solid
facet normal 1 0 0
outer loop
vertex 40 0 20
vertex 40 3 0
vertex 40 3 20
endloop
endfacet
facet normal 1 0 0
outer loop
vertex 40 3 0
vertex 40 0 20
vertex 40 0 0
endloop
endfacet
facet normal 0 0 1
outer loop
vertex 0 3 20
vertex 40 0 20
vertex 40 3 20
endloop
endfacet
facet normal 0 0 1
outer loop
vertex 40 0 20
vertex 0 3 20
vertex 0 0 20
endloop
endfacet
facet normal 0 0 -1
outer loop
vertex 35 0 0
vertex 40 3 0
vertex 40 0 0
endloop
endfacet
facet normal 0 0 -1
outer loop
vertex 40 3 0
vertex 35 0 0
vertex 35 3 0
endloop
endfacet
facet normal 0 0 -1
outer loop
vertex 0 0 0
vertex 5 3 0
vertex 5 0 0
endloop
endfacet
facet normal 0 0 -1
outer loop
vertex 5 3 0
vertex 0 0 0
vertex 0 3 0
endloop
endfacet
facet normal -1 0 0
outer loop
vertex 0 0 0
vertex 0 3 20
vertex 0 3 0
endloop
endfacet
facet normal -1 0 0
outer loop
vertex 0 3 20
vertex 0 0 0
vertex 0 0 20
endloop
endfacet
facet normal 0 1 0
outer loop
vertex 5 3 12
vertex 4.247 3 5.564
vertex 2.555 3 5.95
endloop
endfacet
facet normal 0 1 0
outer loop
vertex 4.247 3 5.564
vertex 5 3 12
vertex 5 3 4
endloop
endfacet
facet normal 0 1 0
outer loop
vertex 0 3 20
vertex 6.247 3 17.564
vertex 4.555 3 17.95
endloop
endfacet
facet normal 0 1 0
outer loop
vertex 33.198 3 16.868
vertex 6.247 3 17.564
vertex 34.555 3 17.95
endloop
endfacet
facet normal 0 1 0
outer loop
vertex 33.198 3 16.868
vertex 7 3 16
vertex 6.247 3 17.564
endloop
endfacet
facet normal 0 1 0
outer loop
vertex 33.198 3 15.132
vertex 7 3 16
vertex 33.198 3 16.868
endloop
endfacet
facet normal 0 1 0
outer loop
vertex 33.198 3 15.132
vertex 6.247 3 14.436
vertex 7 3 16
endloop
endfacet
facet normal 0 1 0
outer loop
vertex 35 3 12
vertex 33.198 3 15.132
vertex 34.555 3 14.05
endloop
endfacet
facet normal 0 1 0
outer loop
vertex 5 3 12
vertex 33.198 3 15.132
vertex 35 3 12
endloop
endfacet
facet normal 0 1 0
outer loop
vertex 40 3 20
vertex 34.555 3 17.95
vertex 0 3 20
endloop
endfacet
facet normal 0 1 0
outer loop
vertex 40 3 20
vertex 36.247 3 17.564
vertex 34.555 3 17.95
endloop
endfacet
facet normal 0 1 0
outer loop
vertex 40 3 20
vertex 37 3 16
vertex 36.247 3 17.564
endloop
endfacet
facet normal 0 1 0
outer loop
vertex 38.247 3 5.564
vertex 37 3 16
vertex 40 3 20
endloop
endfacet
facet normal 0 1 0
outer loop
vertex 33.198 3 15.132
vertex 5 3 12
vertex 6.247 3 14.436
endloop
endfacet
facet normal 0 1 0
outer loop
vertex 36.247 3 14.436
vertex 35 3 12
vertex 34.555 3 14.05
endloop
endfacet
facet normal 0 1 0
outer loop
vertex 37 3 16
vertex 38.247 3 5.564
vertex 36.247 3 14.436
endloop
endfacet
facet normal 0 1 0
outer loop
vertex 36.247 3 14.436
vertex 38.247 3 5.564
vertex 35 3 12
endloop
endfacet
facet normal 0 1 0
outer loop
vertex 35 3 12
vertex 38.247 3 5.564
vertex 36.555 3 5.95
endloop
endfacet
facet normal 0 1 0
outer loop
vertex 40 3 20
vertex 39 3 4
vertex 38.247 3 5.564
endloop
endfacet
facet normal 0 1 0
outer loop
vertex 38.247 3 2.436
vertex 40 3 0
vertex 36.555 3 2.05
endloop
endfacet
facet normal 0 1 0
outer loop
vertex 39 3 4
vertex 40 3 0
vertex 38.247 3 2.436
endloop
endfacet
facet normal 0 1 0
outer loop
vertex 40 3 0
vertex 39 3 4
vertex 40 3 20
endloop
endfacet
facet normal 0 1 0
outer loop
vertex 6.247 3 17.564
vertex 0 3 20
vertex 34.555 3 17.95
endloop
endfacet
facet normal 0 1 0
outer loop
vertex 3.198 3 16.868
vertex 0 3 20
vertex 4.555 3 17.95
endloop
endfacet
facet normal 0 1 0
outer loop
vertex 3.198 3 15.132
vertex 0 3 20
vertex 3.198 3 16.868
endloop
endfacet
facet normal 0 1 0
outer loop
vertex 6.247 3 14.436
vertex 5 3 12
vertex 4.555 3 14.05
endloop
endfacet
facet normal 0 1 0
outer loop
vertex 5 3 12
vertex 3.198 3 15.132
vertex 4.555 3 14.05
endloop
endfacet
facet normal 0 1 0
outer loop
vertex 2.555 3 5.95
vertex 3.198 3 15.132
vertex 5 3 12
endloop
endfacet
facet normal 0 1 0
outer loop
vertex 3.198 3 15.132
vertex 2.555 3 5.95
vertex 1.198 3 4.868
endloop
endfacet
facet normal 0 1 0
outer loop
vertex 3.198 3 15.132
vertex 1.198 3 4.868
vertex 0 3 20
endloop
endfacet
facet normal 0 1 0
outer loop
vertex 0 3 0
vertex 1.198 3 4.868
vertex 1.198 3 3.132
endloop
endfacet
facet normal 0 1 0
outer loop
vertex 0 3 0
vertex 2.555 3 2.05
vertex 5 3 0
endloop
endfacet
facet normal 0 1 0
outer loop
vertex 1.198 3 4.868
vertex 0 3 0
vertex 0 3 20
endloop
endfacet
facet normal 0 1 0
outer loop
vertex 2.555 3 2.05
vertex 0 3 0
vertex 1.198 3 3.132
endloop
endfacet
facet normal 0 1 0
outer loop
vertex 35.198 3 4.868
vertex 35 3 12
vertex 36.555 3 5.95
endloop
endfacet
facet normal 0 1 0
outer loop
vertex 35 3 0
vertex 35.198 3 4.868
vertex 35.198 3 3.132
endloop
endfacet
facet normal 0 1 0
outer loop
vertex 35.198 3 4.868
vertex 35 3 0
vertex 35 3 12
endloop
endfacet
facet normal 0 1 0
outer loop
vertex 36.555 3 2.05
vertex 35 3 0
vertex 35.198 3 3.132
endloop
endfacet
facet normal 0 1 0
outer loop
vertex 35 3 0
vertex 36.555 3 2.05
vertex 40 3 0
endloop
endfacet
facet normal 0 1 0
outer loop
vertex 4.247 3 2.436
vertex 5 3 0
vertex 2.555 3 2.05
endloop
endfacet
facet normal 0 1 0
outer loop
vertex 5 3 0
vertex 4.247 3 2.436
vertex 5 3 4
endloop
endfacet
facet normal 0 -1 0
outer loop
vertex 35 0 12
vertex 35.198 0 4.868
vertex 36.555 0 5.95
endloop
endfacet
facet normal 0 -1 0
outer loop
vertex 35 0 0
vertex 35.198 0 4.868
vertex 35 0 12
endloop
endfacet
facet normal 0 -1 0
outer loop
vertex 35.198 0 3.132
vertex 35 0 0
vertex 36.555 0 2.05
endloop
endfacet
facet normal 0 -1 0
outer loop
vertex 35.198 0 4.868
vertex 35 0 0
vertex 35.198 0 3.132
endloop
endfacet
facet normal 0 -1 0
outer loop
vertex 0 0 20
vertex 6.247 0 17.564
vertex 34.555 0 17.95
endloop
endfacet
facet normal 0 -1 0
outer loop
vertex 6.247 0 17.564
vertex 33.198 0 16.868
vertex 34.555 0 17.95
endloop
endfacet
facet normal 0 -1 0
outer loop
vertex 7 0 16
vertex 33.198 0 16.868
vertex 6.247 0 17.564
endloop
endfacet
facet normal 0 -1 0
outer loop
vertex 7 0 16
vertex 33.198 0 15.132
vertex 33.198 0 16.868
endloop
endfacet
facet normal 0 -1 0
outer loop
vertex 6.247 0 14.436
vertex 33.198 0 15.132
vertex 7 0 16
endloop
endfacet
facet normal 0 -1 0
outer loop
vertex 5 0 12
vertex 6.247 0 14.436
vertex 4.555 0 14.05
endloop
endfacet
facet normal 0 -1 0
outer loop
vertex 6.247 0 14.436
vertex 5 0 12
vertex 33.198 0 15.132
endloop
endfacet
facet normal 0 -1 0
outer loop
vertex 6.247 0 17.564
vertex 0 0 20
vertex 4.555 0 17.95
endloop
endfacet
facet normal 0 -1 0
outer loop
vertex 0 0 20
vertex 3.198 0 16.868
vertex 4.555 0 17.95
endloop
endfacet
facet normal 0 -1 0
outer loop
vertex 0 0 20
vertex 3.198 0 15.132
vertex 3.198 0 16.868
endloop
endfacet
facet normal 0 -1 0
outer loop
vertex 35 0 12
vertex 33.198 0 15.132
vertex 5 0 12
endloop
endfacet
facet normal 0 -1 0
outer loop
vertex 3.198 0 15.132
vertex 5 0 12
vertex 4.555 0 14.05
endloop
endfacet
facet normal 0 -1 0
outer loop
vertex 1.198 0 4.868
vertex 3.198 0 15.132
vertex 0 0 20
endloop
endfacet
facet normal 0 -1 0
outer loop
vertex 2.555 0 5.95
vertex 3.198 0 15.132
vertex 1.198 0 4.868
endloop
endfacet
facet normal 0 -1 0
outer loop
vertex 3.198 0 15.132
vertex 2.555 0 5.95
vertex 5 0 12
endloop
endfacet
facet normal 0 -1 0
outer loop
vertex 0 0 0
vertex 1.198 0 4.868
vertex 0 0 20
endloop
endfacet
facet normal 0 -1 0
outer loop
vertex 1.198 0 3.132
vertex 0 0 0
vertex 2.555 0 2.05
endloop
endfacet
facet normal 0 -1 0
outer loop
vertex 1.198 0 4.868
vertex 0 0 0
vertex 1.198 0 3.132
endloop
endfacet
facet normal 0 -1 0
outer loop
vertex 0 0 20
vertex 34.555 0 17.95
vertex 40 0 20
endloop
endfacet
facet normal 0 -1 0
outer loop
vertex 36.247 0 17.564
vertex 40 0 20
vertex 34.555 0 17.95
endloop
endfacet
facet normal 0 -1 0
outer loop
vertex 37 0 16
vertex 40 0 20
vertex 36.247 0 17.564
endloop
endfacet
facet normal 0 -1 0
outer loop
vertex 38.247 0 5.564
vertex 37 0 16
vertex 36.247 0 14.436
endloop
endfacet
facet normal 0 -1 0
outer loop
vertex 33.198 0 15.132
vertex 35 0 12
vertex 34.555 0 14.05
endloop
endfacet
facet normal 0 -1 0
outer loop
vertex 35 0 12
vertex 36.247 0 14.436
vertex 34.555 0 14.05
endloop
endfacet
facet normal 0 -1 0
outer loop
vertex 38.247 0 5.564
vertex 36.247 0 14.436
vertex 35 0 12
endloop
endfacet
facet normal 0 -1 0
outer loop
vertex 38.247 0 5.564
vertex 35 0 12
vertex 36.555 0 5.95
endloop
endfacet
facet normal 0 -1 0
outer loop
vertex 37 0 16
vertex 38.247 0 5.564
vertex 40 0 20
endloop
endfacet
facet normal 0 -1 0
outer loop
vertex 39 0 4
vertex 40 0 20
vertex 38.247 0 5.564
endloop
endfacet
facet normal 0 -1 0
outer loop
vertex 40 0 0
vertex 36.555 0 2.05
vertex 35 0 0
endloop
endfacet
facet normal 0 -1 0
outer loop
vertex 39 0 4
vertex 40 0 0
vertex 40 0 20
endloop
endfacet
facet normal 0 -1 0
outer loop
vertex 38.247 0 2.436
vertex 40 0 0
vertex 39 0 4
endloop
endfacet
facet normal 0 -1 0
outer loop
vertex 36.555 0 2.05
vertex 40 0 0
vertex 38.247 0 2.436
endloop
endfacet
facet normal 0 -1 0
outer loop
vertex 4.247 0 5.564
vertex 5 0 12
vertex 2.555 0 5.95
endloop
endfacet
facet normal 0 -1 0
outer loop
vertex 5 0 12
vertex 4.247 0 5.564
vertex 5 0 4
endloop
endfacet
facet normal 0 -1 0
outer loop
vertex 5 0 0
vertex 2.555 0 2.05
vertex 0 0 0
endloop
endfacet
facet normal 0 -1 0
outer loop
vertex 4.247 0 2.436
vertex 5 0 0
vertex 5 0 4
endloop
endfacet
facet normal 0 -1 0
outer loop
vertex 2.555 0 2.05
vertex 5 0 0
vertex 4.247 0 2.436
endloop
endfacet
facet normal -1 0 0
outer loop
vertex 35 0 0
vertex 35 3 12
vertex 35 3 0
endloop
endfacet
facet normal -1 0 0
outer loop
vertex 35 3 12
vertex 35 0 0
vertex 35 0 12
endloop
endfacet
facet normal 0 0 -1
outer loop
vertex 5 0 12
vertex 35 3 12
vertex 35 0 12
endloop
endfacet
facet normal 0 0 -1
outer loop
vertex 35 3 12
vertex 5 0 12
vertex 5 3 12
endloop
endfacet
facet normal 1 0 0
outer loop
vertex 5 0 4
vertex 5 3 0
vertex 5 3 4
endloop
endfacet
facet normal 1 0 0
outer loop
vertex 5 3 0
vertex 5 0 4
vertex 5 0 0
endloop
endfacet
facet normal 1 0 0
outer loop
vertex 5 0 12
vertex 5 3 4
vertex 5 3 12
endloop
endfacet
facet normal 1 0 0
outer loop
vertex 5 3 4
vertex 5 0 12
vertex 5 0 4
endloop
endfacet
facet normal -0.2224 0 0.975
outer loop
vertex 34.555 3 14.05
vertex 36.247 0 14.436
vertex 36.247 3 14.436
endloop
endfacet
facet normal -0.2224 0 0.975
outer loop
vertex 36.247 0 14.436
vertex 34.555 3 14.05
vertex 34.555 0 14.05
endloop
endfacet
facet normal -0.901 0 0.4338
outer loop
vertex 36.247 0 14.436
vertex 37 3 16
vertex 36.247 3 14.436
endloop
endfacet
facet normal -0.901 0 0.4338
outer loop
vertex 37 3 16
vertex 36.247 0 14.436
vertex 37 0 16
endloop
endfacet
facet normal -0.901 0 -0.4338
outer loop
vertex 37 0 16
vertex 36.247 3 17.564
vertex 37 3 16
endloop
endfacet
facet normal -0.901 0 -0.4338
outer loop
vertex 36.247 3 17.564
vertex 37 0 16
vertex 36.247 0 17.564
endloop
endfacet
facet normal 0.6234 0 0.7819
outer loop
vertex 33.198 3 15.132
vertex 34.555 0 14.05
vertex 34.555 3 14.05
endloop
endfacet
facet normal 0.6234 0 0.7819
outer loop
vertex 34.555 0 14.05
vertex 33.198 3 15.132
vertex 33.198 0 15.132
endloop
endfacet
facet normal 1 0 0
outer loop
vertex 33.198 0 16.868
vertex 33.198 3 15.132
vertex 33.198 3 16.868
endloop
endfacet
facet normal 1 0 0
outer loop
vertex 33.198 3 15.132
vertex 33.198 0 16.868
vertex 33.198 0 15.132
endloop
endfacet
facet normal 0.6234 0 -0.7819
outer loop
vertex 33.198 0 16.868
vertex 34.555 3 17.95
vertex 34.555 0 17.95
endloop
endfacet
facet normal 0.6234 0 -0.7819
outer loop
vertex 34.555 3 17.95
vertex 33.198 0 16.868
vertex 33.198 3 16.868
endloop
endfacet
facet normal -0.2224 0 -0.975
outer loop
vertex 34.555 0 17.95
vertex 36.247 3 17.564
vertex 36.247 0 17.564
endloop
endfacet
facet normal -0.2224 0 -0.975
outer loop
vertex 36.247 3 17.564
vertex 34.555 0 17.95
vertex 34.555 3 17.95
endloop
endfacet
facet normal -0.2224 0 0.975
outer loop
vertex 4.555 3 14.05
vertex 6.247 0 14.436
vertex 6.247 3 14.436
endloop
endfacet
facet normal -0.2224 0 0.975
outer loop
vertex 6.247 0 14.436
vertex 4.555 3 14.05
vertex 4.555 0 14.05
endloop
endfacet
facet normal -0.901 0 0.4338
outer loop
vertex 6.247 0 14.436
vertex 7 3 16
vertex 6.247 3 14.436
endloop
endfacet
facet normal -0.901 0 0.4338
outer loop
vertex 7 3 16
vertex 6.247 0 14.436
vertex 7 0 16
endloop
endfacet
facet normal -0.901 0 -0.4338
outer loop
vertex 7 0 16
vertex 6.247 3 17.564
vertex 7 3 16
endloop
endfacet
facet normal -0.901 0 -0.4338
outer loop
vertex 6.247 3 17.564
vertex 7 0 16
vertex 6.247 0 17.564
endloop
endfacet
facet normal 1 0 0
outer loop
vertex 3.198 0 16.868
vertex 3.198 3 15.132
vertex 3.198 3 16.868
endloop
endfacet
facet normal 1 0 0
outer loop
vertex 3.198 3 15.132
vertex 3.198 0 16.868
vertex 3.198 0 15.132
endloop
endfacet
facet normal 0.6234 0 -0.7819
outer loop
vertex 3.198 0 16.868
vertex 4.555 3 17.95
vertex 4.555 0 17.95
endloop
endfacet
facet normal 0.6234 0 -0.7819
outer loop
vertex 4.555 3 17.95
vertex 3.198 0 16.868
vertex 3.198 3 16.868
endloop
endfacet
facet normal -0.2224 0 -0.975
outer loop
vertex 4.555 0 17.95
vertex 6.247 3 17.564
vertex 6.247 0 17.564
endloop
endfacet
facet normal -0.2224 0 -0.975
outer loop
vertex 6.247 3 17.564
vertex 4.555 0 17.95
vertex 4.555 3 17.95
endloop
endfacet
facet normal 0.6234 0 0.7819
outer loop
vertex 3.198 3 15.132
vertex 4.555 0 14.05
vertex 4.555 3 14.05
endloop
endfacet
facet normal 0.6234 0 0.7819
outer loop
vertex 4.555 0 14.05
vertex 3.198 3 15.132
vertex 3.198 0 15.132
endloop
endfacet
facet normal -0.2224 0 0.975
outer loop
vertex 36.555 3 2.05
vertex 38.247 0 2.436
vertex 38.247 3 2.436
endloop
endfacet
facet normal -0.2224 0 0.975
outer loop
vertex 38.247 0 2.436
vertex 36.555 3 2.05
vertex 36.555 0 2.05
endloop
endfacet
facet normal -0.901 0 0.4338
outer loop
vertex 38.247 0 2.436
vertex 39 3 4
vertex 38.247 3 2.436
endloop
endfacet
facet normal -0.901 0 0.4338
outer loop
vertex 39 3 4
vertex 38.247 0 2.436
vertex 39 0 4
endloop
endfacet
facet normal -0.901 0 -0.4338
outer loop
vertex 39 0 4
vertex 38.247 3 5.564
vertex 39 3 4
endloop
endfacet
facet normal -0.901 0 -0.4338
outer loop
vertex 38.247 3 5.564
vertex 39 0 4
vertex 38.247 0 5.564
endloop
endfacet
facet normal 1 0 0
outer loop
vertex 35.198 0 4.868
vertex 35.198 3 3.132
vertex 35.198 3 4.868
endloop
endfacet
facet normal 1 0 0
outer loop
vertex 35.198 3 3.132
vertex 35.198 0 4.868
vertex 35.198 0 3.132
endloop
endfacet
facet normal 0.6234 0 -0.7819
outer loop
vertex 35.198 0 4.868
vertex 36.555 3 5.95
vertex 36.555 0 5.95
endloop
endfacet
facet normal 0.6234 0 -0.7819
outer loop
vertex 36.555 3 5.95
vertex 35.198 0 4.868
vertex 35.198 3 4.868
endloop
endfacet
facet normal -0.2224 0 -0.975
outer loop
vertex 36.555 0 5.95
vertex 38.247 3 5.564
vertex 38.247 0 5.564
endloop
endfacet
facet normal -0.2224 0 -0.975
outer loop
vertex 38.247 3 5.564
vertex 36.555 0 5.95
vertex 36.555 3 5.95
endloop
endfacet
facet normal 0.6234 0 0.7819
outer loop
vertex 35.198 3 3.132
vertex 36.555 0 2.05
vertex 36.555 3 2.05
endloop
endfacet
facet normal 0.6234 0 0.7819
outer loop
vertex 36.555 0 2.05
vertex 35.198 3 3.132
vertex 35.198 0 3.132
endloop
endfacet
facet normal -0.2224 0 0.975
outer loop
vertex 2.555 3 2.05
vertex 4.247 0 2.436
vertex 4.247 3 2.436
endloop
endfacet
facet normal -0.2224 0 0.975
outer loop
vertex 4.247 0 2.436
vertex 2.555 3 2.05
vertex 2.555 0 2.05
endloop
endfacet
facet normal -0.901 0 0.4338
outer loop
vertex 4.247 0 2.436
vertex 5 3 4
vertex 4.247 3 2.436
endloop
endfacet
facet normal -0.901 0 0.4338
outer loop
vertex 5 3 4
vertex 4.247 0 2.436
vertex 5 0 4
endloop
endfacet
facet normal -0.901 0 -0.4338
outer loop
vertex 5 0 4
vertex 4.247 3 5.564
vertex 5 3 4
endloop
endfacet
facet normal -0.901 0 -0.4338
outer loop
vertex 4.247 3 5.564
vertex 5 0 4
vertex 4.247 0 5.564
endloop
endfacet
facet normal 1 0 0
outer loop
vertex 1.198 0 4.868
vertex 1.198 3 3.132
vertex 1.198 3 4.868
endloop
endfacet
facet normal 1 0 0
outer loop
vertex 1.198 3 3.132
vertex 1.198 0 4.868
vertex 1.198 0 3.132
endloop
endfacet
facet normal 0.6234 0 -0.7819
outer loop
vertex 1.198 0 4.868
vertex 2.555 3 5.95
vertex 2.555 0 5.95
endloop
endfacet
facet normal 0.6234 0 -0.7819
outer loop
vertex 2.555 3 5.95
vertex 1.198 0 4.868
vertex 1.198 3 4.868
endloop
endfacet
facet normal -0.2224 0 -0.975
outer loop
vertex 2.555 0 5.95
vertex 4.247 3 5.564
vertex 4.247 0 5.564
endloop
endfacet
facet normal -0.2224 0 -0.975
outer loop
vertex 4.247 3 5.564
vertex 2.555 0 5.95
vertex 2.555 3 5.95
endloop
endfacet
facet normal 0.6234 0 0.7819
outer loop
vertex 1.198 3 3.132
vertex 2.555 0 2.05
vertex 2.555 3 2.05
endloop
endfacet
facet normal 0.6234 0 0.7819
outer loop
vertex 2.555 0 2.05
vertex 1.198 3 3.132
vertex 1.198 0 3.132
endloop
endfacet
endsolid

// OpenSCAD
// Mounting bracket for servos
// Nick Pascucci
// December, 2011

servomount();

module servomount(){
  width = 40;
  thickness = 3; 
  height = 20;
  hole_width = 30;
  hole_height = 12;
  mounting_hole_x1 = 35;
  mounting_hole_x2 = 5;
  mounting_hole_z = 16;
  mounting_hole_size = 2;
  servo_hole_x1 = 37;
  servo_hole_x2 = 3;
  servo_hole_z = 4;
  servo_hole_size = 2;

  difference(){
    base(width, thickness, height, hole_width, hole_height);
    mountingholes(mounting_hole_x1, mounting_hole_x2, 
                  mounting_hole_z, mounting_hole_size);
    servoholes(servo_hole_x1, servo_hole_x2, servo_hole_z, servo_hole_size);
  }
}

module mountingholes(x1, x2, z, size){
  translate([x1, -1, z]){
    rotate([-90, 0, 0]){
      cylinder(h = 5, r = size, center=false);
    }
  }
  translate([x2, -1, z]){
    rotate([-90, 0, 0]){
      cylinder(h = 5, r = size, center=false);
    }
  }
}

module servoholes(x1, x2, z, size){
  translate([x1, -1, z]){
    rotate([-90, 0, 0]){
      cylinder(h = 5, r = size, center=false);
    }
  }
  translate([x2, -1, z]){
    rotate([-90, 0, 0]){
      cylinder(h = 5, r = size, center=false);
    }
  }
}

module base(width, thickness, height, hole_width, hole_height){
  difference(){
    cube([width, thickness, height]);
    translate([(width-hole_width)/2, -1, -1]){
      cube([hole_width, thickness + 2, hole_height+1]);
    }
  }
  
}
